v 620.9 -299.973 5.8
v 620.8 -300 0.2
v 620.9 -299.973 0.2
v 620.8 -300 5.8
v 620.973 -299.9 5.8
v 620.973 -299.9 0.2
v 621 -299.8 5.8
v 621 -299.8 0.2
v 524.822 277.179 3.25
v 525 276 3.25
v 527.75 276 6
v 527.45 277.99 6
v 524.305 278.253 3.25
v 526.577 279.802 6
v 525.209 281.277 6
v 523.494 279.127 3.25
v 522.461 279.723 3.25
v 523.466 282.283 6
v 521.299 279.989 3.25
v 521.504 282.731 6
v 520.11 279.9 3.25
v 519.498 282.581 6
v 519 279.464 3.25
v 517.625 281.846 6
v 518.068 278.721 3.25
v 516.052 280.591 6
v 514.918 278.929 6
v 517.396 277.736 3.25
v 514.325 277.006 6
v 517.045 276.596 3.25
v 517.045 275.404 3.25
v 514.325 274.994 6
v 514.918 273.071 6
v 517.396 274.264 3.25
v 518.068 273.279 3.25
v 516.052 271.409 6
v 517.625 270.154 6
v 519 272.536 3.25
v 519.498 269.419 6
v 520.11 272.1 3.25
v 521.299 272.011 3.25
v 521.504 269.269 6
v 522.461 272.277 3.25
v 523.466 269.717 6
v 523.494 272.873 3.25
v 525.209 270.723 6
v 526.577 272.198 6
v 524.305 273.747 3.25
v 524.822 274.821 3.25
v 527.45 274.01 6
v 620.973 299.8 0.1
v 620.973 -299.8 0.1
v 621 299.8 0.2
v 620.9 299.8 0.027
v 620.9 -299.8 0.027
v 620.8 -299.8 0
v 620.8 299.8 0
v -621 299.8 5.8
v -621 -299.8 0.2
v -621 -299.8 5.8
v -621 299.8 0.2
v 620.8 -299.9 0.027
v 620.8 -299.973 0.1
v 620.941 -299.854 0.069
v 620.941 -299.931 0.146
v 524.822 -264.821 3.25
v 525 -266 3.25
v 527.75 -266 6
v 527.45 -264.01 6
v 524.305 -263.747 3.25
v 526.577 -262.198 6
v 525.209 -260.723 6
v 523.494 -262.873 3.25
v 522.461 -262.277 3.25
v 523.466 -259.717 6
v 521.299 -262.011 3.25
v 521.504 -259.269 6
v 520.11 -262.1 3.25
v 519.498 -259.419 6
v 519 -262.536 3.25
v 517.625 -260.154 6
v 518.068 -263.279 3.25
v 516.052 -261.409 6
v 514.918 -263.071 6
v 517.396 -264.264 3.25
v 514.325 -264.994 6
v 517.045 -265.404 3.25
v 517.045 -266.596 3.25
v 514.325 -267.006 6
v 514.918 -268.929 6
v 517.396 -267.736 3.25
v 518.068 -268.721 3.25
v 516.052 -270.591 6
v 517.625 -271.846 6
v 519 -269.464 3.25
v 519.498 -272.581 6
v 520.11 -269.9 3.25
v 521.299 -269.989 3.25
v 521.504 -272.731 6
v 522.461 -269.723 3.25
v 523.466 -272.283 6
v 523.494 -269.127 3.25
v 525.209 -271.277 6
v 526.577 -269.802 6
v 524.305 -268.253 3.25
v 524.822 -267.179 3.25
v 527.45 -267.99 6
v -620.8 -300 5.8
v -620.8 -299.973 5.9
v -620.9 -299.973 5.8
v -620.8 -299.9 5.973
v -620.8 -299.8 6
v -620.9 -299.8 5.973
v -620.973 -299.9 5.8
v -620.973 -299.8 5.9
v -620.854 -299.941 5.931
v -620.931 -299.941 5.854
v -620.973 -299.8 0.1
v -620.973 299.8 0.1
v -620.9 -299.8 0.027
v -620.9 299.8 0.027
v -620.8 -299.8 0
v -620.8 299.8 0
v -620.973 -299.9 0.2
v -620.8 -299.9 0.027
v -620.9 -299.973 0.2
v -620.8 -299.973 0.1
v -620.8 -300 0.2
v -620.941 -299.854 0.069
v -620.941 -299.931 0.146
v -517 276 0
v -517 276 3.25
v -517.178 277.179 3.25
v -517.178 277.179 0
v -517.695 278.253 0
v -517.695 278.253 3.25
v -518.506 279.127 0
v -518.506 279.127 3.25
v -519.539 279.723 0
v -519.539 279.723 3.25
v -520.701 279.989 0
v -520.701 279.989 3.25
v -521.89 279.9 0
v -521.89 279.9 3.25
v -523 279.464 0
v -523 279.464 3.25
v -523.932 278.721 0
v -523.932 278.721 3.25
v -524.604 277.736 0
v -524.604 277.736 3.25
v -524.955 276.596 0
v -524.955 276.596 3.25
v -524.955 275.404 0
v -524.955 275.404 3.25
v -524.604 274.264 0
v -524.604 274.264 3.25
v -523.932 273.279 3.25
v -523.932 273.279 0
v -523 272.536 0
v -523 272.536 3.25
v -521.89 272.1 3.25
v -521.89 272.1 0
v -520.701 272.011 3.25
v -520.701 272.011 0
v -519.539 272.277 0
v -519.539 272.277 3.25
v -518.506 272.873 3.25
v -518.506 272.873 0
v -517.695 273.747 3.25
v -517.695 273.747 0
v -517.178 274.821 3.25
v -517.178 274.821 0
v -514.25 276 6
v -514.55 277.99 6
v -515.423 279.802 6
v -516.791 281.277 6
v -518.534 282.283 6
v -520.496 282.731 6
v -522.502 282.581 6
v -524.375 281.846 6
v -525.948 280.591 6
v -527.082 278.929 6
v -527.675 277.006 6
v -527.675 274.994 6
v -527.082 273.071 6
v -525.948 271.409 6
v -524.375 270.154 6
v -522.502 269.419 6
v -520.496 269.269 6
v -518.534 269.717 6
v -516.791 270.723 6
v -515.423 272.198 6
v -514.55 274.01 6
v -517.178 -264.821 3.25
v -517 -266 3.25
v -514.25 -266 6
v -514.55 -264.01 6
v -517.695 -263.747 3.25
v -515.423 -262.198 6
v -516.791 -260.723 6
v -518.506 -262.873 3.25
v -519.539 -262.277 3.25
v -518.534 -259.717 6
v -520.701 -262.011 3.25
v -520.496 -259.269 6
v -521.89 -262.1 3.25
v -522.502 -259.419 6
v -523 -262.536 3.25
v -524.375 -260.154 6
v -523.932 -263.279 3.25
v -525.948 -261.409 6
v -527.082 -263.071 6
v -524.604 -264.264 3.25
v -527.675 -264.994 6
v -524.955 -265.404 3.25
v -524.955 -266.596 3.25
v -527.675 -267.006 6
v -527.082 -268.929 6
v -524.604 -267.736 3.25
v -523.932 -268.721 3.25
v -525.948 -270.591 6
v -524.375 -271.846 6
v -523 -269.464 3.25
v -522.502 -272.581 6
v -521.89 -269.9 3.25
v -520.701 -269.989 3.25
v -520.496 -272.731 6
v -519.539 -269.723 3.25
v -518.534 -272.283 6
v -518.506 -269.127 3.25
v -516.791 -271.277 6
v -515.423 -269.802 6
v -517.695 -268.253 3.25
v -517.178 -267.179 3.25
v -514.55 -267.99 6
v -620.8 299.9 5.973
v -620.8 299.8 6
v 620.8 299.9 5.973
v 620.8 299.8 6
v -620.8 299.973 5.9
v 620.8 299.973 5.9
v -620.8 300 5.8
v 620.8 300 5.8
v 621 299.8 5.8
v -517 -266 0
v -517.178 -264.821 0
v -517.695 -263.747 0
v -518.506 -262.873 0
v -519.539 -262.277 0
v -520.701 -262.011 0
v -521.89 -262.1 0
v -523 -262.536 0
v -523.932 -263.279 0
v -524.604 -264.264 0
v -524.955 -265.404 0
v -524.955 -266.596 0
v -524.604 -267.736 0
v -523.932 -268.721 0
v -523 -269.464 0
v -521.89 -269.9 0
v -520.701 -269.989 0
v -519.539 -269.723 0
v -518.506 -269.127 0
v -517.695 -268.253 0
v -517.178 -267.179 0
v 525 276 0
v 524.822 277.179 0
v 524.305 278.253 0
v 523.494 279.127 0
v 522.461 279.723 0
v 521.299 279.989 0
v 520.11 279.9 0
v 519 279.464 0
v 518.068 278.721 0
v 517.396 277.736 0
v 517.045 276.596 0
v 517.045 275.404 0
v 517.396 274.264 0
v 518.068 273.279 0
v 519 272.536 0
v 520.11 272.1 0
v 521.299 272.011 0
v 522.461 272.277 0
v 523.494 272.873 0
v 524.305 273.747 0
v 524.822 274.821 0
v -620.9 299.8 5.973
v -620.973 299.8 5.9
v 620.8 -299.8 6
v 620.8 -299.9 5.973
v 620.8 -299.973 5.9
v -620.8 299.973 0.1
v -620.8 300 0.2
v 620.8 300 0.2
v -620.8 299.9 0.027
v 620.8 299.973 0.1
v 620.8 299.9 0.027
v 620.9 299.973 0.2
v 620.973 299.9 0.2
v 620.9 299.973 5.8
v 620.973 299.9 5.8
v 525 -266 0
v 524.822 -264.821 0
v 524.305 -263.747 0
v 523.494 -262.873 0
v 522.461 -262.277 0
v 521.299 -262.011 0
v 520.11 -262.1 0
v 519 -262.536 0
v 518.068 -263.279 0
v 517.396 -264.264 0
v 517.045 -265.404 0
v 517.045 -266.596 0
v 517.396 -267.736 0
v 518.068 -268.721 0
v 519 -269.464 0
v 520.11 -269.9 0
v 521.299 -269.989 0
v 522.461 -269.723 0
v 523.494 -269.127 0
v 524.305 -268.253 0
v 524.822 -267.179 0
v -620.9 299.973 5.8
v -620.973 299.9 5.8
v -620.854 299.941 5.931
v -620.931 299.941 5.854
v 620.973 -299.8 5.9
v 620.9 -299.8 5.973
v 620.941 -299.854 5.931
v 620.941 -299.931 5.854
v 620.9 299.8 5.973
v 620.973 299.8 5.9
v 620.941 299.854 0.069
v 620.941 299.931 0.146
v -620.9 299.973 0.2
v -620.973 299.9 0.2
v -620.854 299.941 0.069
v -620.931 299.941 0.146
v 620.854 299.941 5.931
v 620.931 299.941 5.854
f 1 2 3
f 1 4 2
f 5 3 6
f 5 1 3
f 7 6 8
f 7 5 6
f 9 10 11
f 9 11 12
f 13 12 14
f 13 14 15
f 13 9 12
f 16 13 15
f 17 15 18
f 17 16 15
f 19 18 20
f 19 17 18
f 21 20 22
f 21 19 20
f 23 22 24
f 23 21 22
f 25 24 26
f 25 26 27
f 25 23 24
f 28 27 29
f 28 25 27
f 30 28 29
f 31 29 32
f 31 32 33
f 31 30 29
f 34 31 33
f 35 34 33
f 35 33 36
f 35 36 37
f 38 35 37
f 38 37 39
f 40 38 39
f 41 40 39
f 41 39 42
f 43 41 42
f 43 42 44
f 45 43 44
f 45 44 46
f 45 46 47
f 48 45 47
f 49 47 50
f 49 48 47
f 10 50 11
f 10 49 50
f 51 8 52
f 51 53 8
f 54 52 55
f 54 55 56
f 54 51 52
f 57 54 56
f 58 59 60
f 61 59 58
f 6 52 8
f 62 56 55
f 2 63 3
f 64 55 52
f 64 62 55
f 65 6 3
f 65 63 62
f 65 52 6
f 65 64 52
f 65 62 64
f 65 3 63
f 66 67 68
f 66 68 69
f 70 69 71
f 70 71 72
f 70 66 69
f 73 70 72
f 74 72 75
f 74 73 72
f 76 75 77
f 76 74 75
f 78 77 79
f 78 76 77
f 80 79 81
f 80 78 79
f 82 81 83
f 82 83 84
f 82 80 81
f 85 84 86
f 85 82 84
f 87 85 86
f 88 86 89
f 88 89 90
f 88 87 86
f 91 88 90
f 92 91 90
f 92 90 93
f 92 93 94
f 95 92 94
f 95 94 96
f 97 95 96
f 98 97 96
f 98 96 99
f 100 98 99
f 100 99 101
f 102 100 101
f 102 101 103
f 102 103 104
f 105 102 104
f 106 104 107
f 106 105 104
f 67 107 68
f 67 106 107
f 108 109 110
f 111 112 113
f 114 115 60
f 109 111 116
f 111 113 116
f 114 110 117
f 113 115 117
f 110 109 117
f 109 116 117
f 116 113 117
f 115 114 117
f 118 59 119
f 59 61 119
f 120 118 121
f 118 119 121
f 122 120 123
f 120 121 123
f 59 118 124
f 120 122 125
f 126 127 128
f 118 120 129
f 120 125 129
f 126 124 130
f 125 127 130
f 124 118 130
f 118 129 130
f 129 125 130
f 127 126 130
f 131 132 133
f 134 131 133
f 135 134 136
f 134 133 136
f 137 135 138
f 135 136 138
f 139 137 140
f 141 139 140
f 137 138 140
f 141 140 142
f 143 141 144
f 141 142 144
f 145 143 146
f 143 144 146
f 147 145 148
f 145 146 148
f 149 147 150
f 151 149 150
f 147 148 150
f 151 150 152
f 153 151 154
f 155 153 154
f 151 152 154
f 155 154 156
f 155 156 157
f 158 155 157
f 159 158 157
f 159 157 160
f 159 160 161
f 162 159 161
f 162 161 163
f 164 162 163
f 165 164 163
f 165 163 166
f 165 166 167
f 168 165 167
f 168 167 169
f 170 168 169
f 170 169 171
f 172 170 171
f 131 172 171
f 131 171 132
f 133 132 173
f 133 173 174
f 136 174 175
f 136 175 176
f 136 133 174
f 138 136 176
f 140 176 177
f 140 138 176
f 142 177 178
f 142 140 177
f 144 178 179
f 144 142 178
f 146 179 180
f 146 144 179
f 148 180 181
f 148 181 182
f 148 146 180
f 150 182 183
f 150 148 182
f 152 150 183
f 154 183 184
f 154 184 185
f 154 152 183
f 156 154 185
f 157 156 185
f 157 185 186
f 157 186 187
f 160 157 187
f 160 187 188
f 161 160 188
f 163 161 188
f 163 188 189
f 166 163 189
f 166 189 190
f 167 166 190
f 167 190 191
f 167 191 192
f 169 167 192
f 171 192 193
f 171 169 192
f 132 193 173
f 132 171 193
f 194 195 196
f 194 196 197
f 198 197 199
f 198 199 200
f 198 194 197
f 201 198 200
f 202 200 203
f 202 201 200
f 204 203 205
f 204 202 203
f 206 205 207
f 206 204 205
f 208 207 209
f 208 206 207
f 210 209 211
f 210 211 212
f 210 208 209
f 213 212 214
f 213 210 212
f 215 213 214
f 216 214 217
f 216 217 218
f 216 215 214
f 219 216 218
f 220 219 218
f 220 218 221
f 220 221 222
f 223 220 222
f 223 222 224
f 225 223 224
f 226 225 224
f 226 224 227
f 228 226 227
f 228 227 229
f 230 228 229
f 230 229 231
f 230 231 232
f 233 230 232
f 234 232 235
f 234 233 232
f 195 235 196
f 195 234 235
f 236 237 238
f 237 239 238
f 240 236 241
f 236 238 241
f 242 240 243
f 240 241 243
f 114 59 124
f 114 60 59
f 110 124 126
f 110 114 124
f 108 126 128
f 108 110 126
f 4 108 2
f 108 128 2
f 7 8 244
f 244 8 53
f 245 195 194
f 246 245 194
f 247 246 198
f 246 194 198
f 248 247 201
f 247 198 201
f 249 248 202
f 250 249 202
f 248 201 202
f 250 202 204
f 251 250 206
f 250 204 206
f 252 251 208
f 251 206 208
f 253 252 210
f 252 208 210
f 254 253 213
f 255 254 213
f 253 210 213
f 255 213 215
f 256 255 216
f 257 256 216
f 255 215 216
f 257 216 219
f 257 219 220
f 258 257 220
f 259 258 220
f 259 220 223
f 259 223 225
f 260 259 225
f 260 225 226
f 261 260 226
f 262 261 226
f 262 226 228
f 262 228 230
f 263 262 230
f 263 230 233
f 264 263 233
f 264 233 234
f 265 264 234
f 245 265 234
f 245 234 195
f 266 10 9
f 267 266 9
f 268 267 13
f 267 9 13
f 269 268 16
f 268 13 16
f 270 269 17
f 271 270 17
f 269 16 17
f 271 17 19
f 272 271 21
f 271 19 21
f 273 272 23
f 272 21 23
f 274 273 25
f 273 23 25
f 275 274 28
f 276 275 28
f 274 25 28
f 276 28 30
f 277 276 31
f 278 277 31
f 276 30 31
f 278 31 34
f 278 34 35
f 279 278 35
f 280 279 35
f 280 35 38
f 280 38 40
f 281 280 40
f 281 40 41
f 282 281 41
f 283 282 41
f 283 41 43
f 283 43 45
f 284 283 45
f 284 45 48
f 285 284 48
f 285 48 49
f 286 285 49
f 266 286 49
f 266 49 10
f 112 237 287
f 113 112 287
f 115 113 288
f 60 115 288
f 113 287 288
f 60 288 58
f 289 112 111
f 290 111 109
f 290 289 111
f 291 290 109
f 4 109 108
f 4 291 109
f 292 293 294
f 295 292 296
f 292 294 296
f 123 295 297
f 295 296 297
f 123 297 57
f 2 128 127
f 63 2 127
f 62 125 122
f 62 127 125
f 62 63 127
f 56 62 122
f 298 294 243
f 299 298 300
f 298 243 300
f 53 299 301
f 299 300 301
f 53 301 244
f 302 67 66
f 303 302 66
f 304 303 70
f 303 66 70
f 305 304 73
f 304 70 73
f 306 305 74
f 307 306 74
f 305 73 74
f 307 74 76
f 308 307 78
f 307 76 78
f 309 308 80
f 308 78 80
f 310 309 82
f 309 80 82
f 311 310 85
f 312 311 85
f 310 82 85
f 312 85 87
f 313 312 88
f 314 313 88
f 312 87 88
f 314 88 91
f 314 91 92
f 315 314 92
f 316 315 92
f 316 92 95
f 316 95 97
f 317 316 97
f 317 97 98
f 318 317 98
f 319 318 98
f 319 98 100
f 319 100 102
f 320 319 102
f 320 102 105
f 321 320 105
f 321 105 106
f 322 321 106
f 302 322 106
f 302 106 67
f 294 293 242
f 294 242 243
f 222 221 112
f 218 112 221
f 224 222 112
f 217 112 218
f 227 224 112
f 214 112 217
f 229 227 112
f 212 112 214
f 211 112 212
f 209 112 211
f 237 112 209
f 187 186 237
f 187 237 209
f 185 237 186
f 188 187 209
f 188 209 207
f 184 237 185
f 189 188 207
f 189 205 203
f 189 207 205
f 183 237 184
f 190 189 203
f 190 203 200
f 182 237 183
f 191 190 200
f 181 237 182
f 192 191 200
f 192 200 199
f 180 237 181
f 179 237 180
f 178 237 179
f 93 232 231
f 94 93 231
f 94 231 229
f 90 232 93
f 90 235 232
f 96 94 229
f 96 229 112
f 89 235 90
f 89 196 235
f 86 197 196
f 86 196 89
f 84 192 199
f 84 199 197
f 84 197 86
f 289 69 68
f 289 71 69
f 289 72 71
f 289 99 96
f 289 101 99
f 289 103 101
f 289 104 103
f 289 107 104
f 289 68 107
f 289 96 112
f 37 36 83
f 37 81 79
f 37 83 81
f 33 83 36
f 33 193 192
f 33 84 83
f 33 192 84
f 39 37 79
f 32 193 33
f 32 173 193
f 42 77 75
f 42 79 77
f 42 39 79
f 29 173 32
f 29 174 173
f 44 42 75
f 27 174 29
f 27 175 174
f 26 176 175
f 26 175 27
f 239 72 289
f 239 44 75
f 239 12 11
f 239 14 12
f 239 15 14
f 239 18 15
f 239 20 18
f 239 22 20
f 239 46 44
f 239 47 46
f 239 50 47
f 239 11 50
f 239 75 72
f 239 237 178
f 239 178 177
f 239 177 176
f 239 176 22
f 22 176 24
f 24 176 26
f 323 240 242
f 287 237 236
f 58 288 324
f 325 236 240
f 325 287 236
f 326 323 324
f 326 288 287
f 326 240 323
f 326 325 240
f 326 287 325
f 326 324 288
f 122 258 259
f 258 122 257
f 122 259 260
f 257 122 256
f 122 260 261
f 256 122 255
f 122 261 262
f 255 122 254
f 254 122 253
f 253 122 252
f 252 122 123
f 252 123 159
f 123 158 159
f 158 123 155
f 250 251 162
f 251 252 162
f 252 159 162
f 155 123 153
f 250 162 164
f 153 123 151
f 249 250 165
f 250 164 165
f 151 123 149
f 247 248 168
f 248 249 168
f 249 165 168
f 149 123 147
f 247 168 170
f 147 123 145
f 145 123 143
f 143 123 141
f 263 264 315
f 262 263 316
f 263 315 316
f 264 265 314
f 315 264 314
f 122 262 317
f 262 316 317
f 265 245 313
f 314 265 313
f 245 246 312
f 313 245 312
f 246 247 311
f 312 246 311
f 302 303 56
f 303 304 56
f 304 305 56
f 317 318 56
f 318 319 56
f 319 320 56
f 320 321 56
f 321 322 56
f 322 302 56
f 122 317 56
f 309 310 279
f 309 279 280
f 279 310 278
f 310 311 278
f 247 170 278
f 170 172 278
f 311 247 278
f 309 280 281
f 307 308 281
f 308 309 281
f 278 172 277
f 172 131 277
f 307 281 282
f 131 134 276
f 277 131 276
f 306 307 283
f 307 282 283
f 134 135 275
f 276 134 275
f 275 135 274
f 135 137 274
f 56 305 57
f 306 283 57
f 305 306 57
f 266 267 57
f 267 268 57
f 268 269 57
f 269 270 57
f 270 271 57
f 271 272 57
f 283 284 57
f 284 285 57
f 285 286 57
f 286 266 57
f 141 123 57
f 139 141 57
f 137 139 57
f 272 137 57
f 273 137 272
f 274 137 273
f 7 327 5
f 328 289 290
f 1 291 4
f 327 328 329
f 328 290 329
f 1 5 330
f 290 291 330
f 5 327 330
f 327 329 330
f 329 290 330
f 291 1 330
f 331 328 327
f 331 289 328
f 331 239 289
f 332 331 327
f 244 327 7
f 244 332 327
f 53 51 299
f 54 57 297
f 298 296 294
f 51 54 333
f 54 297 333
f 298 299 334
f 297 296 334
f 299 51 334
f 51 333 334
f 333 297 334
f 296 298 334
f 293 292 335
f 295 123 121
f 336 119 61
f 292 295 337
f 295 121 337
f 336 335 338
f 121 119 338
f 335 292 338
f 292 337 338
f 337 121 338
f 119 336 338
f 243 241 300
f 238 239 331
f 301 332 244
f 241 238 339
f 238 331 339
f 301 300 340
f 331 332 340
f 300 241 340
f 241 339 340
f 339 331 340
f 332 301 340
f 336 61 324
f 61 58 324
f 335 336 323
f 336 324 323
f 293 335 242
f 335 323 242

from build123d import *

# Parameters (mm, degrees)
SKETCH1_W           = 1242
SKETCH1_H           = 600
BOSS_EXTRUDE1_DEPTH = 6
SKETCH2_R           = 4
CUT_EXTRUDE1_DEPTH  = 7
CHAMFER1_SIZE       = 2.75
FILLET1_R           = 0.2


with BuildPart() as part:
    # Sketch1 → Boss-Extrude1 (new body)
    with BuildSketch(Plane.XY):
        Rectangle(SKETCH1_W, SKETCH1_H)
    extrude(amount=BOSS_EXTRUDE1_DEPTH)

    # Sketch2 → Cut-Extrude1 (cut, through all)
    with BuildSketch(Plane.XY.offset(6)):
        with Locations((-521, 276)):
            Circle(SKETCH2_R)
        with Locations((521, 276)):
            Circle(SKETCH2_R)
        with Locations((521, -266)):
            Circle(SKETCH2_R)
        with Locations((-521, -266)):
            Circle(SKETCH2_R)
    extrude(amount=-CUT_EXTRUDE1_DEPTH, mode=Mode.SUBTRACT)

    # Chamfer1
    chamfer1_edges = [part.edges().sort_by_distance(p)[0] for p in [
        (-525, 276, 6),
        (517, 276, 6),
        (517, -266, 6),
        (-525, -266, 6),
    ]]
    chamfer(chamfer1_edges, length=CHAMFER1_SIZE)

    # Fillet1
    fillet1_edges = [part.edges().sort_by_distance(p)[0] for p in [
        (-621, 0, 6),
        (0, -300, 6),
        (621, 0, 6),
        (0, -300, 0),
        (-621, 0, 0),
        (0, 300, 0),
        (621, 0, 0),
        (0, 300, 6),
        (621, -300, 3),
        (-621, -300, 3),
        (-621, 300, 3),
        (621, 300, 3),
    ]]
    fillet(fillet1_edges, radius=FILLET1_R)


solid = part.part
